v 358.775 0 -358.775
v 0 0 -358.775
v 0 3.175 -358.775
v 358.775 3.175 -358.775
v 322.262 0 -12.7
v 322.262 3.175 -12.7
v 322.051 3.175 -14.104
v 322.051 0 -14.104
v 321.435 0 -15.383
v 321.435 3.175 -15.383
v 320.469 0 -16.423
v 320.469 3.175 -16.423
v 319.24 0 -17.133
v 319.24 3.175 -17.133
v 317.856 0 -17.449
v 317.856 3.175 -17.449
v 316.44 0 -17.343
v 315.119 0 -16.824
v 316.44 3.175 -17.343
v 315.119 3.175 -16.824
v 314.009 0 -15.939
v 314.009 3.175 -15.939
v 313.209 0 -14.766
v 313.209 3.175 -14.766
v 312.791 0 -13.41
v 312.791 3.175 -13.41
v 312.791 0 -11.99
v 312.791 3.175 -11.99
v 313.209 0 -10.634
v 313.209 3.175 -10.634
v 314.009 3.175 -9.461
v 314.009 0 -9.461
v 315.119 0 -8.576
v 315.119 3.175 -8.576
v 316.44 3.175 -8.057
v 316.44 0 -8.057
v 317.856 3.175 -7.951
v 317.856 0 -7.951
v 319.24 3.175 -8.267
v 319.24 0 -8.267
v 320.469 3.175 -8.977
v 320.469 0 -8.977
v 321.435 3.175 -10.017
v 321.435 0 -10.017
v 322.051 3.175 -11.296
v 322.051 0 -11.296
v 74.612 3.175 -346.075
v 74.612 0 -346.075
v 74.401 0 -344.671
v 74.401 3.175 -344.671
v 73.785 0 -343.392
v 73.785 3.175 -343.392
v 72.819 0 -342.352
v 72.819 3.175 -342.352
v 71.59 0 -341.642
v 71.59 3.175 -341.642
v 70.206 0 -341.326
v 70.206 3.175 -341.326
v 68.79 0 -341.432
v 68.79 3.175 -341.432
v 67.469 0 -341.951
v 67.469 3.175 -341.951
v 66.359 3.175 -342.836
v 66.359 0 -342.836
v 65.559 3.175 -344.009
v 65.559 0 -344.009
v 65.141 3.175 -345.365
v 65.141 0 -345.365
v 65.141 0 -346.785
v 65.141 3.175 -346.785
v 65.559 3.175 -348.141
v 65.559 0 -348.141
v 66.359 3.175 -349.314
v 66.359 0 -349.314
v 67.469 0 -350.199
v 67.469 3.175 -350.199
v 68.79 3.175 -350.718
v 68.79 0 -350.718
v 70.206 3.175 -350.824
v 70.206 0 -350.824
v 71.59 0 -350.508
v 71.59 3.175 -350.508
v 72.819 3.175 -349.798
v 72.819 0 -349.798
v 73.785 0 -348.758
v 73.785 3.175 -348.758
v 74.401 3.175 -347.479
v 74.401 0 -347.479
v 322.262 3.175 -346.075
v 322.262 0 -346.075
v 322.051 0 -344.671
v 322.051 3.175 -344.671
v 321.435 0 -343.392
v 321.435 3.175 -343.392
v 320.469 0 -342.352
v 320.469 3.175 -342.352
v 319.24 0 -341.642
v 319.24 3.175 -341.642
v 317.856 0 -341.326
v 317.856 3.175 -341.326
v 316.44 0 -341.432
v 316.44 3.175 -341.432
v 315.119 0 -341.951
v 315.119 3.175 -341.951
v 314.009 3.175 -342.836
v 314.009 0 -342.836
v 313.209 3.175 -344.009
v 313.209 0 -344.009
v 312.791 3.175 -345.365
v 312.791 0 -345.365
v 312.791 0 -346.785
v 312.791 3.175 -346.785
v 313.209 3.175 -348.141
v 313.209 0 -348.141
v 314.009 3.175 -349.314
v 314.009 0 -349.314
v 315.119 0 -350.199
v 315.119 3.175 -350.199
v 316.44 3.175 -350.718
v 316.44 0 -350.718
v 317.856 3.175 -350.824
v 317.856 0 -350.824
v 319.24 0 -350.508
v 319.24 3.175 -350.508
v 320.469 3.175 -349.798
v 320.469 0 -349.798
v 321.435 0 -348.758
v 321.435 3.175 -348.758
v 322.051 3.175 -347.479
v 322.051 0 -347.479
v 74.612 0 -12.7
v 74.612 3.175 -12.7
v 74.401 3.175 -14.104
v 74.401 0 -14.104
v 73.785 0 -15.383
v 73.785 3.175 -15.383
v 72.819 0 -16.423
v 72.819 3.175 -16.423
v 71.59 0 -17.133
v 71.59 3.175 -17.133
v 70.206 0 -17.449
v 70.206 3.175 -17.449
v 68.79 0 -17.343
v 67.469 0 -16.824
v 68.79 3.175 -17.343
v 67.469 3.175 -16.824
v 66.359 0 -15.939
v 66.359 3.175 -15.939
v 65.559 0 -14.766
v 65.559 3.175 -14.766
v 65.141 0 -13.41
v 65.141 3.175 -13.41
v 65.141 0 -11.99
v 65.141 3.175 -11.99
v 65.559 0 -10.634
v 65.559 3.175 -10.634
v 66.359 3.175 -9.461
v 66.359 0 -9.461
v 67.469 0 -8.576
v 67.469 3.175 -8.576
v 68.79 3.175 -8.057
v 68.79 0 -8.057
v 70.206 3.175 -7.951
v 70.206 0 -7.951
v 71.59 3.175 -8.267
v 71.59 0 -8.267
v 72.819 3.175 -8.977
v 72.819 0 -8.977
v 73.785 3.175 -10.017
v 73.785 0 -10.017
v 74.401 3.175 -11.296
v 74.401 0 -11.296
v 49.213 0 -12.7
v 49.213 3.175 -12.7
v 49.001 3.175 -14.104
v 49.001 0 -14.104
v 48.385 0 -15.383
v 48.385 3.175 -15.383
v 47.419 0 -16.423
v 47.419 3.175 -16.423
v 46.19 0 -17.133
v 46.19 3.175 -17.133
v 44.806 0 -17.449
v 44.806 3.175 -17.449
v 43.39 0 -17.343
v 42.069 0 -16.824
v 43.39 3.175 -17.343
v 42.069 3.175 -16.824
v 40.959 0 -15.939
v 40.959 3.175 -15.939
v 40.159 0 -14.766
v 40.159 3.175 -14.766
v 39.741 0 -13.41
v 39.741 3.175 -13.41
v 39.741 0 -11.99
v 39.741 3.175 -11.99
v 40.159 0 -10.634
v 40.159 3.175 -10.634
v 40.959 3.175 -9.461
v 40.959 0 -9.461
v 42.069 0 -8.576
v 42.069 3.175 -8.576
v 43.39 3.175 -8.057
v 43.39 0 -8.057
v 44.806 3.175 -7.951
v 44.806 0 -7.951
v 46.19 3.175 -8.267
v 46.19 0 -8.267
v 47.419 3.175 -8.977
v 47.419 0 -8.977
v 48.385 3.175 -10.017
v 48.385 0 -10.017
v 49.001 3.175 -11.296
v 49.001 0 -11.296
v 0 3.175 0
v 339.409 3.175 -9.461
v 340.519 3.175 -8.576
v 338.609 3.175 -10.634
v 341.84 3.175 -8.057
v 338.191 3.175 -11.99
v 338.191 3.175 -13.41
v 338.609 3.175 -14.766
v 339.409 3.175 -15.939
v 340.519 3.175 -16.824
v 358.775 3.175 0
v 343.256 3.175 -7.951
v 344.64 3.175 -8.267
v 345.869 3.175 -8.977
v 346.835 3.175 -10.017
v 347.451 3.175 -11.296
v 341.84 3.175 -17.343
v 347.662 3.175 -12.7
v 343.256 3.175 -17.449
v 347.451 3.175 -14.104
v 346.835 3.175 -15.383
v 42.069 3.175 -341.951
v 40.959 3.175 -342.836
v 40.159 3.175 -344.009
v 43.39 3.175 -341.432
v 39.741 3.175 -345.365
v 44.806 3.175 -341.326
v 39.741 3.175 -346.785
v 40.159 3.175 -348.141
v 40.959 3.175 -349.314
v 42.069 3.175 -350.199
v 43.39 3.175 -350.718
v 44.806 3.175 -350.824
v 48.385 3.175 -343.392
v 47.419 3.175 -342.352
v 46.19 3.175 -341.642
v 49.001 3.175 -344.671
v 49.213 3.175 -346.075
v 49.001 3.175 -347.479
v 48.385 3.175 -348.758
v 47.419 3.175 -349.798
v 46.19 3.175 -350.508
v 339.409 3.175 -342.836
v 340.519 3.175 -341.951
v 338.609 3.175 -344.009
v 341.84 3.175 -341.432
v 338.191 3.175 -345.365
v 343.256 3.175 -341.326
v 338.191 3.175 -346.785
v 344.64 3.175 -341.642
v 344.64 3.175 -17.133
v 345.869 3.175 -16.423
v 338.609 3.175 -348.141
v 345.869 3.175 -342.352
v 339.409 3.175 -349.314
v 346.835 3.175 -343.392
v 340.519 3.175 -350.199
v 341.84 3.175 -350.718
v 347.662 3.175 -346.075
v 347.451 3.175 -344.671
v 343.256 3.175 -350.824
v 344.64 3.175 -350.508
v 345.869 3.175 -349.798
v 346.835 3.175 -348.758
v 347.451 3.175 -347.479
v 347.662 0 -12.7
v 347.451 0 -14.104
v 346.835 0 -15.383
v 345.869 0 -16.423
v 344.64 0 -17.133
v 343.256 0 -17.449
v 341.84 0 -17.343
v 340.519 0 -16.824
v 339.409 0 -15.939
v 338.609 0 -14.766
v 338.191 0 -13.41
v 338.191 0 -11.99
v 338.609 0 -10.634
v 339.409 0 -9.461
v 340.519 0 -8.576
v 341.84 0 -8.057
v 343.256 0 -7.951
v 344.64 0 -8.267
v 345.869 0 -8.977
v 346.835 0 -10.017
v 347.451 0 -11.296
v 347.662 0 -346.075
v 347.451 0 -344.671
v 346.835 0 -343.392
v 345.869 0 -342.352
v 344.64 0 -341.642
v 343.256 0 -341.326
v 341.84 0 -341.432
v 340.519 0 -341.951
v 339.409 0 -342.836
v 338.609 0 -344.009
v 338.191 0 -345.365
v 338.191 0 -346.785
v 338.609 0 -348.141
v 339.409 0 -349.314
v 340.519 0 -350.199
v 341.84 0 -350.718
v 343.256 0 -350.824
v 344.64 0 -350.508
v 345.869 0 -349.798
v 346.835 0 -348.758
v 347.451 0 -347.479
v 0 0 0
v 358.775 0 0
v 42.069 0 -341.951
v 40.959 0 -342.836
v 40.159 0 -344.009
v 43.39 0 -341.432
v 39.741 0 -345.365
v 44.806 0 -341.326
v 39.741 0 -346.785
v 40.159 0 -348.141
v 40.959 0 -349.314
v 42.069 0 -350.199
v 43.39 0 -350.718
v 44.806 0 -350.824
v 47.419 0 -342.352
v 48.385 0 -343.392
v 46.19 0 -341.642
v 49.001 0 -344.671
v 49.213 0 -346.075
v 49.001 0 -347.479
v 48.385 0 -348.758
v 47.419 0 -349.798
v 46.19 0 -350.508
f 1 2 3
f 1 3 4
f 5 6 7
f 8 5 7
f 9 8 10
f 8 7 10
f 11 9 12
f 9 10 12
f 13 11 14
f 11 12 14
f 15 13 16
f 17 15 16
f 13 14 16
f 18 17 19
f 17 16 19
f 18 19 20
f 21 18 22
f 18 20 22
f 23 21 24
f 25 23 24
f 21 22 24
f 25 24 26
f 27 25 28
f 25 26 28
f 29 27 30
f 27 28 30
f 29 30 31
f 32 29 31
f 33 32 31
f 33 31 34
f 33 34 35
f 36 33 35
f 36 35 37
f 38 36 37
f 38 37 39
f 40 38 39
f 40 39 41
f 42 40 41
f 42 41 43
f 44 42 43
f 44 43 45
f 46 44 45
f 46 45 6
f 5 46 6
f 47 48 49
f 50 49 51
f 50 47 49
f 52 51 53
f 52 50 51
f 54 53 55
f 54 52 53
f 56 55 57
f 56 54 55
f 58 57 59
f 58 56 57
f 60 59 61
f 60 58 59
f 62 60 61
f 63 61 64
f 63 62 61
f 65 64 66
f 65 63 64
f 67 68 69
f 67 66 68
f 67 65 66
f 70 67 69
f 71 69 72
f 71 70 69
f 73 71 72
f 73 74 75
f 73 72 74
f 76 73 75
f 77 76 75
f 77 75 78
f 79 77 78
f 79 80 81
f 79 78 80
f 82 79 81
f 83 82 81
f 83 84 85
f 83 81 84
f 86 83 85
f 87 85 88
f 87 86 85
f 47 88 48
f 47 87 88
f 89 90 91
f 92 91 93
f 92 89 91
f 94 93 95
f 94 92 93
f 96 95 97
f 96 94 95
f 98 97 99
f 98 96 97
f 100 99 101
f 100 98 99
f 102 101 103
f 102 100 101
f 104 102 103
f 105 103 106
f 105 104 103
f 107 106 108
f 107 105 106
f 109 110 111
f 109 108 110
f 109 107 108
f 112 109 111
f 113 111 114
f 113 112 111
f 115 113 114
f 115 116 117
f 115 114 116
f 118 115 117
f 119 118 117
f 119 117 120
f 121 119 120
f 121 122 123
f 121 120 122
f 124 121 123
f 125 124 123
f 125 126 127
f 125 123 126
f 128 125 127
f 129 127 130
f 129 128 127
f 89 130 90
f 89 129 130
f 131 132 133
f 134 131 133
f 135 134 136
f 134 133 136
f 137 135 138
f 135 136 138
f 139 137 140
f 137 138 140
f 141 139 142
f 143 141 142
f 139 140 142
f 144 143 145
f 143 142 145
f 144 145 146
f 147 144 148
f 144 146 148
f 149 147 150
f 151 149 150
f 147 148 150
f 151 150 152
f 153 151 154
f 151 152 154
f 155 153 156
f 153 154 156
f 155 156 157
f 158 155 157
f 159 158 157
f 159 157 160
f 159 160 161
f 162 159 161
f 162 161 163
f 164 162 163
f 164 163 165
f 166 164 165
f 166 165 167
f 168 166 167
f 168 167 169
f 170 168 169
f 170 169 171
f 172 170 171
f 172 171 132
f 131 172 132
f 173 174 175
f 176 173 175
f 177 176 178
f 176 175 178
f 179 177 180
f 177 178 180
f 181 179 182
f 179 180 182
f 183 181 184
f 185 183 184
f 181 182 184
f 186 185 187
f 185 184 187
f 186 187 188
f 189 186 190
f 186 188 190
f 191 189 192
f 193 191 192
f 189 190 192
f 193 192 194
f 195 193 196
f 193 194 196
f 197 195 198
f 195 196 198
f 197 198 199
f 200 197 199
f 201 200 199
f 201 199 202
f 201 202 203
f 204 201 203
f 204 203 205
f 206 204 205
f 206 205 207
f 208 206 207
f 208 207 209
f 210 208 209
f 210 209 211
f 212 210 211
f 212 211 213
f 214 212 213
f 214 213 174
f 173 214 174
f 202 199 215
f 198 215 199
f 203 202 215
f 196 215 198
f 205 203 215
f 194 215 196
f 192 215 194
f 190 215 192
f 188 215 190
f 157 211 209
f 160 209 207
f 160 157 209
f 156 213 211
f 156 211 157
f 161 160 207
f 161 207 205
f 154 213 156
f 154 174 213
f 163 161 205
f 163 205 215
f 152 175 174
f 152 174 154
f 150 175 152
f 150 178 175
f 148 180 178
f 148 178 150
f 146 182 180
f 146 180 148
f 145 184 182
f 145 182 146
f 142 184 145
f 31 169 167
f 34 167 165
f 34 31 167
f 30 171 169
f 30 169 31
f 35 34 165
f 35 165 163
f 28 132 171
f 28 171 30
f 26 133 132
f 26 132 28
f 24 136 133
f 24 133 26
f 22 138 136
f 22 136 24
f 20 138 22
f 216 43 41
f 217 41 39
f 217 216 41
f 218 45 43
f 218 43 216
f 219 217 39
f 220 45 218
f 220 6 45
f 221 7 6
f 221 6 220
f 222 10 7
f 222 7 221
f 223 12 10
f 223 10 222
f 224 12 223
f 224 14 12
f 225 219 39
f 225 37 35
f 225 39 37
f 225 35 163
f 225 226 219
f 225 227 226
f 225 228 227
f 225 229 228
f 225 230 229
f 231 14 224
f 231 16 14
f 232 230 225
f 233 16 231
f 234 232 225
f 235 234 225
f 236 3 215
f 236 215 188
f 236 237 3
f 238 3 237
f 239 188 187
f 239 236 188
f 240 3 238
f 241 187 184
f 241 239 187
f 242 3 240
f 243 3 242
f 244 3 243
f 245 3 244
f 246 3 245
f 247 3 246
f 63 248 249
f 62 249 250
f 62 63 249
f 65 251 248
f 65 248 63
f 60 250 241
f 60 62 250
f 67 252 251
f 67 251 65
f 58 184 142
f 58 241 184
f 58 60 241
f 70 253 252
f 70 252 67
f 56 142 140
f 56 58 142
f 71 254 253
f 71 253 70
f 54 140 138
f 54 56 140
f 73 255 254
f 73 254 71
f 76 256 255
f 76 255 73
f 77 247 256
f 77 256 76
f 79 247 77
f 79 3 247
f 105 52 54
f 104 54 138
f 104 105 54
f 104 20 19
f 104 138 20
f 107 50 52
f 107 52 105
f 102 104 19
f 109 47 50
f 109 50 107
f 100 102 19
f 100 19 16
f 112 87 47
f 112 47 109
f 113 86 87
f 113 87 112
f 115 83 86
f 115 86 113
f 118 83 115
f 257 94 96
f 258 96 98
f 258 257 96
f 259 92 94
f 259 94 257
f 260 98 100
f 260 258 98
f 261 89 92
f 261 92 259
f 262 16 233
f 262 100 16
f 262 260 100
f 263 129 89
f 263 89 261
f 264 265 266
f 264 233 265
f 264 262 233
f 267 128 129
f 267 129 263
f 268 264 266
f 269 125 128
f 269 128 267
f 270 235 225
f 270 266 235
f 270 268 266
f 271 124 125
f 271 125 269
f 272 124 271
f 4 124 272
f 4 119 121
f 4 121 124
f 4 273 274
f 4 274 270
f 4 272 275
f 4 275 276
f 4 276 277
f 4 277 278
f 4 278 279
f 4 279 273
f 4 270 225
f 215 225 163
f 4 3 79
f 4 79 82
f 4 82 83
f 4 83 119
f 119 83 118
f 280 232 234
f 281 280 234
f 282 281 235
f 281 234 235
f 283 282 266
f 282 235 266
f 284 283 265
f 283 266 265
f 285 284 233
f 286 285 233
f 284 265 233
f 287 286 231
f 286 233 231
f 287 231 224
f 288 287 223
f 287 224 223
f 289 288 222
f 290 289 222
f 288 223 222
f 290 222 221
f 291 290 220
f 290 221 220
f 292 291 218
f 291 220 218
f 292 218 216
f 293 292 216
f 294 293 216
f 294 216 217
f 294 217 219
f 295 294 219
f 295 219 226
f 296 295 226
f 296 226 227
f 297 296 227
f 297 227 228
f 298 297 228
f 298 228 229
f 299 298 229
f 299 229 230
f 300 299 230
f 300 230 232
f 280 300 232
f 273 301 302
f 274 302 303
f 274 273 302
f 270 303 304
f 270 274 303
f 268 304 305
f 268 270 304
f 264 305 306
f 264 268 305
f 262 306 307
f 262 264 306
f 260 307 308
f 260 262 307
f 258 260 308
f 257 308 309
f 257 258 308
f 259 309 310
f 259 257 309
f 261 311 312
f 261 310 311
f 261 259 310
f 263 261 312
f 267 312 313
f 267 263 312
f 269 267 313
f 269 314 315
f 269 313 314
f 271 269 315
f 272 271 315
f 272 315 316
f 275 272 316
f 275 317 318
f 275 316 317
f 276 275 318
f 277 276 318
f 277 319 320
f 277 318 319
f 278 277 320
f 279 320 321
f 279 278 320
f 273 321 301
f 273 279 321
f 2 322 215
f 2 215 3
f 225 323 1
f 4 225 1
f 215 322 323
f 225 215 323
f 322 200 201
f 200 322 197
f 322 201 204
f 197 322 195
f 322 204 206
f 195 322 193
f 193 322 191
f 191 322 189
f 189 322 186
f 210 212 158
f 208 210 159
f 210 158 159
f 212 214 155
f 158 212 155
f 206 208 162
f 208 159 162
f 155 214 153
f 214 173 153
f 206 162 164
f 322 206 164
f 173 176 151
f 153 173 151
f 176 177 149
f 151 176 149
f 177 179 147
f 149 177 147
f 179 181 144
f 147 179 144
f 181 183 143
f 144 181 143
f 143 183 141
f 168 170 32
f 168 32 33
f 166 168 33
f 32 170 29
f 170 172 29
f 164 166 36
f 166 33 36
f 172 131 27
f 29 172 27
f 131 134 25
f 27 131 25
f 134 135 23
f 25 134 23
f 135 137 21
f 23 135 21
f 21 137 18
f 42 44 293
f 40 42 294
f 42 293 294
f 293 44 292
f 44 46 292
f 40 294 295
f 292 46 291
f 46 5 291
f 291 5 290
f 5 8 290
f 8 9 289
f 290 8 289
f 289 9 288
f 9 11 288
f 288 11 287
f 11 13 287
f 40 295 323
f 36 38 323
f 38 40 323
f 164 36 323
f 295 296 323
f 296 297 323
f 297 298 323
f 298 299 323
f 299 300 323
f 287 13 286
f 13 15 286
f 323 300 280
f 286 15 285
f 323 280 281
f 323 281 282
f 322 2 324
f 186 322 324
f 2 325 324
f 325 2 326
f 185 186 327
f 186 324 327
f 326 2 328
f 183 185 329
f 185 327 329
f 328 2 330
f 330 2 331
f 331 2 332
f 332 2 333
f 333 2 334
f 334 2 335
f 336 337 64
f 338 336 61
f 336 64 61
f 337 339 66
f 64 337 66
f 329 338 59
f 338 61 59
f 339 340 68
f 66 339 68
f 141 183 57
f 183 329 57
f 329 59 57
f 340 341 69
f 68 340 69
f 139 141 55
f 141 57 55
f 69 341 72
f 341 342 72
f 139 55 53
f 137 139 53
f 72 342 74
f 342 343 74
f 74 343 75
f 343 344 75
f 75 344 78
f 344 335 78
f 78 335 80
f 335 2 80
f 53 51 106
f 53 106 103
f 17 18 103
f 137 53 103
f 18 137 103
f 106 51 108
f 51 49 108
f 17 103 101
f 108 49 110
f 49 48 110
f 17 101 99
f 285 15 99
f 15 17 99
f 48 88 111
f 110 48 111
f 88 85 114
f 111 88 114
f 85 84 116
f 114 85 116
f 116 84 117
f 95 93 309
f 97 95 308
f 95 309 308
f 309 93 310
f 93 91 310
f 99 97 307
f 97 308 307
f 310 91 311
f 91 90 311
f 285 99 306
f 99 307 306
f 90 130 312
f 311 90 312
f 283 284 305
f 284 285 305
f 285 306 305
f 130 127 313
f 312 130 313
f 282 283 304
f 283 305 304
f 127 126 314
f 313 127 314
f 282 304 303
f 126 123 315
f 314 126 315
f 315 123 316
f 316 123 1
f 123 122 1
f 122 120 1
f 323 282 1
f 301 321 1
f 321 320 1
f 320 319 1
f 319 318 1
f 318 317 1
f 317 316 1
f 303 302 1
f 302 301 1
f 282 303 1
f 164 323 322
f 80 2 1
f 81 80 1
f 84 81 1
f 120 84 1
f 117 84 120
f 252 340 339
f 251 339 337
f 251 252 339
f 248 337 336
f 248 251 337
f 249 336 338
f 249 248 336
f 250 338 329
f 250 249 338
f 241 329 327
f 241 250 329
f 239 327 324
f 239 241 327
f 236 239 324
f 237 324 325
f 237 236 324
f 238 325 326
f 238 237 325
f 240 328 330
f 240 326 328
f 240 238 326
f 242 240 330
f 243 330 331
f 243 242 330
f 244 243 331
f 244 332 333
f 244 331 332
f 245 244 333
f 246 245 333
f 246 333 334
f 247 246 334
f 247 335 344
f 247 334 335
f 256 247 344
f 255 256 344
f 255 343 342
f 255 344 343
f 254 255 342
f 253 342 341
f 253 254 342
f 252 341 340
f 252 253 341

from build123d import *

# Parameters (mm, degrees)
SKETCH1_W           = 358.775
SKETCH1_H           = 358.775
BOSS_EXTRUDE1_DEPTH = 3.175
SKETCH2_R           = 4.7625
CUT_EXTRUDE1_DEPTH  = 4.175


with BuildPart() as part:
    # Sketch1 → Boss-Extrude1 (new body)
    with BuildSketch(Plane(origin=(0, 0, 0), x_dir=(1, 0, 0), z_dir=(0, 1, 0))):
        with Locations((179.3875, 179.3875)):
            Rectangle(SKETCH1_W, SKETCH1_H)
    extrude(amount=BOSS_EXTRUDE1_DEPTH)

    # Sketch2 → Cut-Extrude1 (cut, through all)
    with BuildSketch(Plane(origin=(0, 3.175, 0), x_dir=(1, 0, 0), z_dir=(0, 1, 0))):
        with Locations((44.45, 12.7)):
            Circle(SKETCH2_R)
        with Locations((69.85, 12.7)):
            Circle(SKETCH2_R)
        with Locations((317.5, 12.7)):
            Circle(SKETCH2_R)
        with Locations((342.9, 12.7)):
            Circle(SKETCH2_R)
    cut_extrude1 = extrude(amount=-CUT_EXTRUDE1_DEPTH, mode=Mode.SUBTRACT)

    # Mirror1: Cut-Extrude1 across plane
    add(cut_extrude1.mirror(Plane.XY.offset(-179.3875)), mode=Mode.SUBTRACT)


solid = part.part
